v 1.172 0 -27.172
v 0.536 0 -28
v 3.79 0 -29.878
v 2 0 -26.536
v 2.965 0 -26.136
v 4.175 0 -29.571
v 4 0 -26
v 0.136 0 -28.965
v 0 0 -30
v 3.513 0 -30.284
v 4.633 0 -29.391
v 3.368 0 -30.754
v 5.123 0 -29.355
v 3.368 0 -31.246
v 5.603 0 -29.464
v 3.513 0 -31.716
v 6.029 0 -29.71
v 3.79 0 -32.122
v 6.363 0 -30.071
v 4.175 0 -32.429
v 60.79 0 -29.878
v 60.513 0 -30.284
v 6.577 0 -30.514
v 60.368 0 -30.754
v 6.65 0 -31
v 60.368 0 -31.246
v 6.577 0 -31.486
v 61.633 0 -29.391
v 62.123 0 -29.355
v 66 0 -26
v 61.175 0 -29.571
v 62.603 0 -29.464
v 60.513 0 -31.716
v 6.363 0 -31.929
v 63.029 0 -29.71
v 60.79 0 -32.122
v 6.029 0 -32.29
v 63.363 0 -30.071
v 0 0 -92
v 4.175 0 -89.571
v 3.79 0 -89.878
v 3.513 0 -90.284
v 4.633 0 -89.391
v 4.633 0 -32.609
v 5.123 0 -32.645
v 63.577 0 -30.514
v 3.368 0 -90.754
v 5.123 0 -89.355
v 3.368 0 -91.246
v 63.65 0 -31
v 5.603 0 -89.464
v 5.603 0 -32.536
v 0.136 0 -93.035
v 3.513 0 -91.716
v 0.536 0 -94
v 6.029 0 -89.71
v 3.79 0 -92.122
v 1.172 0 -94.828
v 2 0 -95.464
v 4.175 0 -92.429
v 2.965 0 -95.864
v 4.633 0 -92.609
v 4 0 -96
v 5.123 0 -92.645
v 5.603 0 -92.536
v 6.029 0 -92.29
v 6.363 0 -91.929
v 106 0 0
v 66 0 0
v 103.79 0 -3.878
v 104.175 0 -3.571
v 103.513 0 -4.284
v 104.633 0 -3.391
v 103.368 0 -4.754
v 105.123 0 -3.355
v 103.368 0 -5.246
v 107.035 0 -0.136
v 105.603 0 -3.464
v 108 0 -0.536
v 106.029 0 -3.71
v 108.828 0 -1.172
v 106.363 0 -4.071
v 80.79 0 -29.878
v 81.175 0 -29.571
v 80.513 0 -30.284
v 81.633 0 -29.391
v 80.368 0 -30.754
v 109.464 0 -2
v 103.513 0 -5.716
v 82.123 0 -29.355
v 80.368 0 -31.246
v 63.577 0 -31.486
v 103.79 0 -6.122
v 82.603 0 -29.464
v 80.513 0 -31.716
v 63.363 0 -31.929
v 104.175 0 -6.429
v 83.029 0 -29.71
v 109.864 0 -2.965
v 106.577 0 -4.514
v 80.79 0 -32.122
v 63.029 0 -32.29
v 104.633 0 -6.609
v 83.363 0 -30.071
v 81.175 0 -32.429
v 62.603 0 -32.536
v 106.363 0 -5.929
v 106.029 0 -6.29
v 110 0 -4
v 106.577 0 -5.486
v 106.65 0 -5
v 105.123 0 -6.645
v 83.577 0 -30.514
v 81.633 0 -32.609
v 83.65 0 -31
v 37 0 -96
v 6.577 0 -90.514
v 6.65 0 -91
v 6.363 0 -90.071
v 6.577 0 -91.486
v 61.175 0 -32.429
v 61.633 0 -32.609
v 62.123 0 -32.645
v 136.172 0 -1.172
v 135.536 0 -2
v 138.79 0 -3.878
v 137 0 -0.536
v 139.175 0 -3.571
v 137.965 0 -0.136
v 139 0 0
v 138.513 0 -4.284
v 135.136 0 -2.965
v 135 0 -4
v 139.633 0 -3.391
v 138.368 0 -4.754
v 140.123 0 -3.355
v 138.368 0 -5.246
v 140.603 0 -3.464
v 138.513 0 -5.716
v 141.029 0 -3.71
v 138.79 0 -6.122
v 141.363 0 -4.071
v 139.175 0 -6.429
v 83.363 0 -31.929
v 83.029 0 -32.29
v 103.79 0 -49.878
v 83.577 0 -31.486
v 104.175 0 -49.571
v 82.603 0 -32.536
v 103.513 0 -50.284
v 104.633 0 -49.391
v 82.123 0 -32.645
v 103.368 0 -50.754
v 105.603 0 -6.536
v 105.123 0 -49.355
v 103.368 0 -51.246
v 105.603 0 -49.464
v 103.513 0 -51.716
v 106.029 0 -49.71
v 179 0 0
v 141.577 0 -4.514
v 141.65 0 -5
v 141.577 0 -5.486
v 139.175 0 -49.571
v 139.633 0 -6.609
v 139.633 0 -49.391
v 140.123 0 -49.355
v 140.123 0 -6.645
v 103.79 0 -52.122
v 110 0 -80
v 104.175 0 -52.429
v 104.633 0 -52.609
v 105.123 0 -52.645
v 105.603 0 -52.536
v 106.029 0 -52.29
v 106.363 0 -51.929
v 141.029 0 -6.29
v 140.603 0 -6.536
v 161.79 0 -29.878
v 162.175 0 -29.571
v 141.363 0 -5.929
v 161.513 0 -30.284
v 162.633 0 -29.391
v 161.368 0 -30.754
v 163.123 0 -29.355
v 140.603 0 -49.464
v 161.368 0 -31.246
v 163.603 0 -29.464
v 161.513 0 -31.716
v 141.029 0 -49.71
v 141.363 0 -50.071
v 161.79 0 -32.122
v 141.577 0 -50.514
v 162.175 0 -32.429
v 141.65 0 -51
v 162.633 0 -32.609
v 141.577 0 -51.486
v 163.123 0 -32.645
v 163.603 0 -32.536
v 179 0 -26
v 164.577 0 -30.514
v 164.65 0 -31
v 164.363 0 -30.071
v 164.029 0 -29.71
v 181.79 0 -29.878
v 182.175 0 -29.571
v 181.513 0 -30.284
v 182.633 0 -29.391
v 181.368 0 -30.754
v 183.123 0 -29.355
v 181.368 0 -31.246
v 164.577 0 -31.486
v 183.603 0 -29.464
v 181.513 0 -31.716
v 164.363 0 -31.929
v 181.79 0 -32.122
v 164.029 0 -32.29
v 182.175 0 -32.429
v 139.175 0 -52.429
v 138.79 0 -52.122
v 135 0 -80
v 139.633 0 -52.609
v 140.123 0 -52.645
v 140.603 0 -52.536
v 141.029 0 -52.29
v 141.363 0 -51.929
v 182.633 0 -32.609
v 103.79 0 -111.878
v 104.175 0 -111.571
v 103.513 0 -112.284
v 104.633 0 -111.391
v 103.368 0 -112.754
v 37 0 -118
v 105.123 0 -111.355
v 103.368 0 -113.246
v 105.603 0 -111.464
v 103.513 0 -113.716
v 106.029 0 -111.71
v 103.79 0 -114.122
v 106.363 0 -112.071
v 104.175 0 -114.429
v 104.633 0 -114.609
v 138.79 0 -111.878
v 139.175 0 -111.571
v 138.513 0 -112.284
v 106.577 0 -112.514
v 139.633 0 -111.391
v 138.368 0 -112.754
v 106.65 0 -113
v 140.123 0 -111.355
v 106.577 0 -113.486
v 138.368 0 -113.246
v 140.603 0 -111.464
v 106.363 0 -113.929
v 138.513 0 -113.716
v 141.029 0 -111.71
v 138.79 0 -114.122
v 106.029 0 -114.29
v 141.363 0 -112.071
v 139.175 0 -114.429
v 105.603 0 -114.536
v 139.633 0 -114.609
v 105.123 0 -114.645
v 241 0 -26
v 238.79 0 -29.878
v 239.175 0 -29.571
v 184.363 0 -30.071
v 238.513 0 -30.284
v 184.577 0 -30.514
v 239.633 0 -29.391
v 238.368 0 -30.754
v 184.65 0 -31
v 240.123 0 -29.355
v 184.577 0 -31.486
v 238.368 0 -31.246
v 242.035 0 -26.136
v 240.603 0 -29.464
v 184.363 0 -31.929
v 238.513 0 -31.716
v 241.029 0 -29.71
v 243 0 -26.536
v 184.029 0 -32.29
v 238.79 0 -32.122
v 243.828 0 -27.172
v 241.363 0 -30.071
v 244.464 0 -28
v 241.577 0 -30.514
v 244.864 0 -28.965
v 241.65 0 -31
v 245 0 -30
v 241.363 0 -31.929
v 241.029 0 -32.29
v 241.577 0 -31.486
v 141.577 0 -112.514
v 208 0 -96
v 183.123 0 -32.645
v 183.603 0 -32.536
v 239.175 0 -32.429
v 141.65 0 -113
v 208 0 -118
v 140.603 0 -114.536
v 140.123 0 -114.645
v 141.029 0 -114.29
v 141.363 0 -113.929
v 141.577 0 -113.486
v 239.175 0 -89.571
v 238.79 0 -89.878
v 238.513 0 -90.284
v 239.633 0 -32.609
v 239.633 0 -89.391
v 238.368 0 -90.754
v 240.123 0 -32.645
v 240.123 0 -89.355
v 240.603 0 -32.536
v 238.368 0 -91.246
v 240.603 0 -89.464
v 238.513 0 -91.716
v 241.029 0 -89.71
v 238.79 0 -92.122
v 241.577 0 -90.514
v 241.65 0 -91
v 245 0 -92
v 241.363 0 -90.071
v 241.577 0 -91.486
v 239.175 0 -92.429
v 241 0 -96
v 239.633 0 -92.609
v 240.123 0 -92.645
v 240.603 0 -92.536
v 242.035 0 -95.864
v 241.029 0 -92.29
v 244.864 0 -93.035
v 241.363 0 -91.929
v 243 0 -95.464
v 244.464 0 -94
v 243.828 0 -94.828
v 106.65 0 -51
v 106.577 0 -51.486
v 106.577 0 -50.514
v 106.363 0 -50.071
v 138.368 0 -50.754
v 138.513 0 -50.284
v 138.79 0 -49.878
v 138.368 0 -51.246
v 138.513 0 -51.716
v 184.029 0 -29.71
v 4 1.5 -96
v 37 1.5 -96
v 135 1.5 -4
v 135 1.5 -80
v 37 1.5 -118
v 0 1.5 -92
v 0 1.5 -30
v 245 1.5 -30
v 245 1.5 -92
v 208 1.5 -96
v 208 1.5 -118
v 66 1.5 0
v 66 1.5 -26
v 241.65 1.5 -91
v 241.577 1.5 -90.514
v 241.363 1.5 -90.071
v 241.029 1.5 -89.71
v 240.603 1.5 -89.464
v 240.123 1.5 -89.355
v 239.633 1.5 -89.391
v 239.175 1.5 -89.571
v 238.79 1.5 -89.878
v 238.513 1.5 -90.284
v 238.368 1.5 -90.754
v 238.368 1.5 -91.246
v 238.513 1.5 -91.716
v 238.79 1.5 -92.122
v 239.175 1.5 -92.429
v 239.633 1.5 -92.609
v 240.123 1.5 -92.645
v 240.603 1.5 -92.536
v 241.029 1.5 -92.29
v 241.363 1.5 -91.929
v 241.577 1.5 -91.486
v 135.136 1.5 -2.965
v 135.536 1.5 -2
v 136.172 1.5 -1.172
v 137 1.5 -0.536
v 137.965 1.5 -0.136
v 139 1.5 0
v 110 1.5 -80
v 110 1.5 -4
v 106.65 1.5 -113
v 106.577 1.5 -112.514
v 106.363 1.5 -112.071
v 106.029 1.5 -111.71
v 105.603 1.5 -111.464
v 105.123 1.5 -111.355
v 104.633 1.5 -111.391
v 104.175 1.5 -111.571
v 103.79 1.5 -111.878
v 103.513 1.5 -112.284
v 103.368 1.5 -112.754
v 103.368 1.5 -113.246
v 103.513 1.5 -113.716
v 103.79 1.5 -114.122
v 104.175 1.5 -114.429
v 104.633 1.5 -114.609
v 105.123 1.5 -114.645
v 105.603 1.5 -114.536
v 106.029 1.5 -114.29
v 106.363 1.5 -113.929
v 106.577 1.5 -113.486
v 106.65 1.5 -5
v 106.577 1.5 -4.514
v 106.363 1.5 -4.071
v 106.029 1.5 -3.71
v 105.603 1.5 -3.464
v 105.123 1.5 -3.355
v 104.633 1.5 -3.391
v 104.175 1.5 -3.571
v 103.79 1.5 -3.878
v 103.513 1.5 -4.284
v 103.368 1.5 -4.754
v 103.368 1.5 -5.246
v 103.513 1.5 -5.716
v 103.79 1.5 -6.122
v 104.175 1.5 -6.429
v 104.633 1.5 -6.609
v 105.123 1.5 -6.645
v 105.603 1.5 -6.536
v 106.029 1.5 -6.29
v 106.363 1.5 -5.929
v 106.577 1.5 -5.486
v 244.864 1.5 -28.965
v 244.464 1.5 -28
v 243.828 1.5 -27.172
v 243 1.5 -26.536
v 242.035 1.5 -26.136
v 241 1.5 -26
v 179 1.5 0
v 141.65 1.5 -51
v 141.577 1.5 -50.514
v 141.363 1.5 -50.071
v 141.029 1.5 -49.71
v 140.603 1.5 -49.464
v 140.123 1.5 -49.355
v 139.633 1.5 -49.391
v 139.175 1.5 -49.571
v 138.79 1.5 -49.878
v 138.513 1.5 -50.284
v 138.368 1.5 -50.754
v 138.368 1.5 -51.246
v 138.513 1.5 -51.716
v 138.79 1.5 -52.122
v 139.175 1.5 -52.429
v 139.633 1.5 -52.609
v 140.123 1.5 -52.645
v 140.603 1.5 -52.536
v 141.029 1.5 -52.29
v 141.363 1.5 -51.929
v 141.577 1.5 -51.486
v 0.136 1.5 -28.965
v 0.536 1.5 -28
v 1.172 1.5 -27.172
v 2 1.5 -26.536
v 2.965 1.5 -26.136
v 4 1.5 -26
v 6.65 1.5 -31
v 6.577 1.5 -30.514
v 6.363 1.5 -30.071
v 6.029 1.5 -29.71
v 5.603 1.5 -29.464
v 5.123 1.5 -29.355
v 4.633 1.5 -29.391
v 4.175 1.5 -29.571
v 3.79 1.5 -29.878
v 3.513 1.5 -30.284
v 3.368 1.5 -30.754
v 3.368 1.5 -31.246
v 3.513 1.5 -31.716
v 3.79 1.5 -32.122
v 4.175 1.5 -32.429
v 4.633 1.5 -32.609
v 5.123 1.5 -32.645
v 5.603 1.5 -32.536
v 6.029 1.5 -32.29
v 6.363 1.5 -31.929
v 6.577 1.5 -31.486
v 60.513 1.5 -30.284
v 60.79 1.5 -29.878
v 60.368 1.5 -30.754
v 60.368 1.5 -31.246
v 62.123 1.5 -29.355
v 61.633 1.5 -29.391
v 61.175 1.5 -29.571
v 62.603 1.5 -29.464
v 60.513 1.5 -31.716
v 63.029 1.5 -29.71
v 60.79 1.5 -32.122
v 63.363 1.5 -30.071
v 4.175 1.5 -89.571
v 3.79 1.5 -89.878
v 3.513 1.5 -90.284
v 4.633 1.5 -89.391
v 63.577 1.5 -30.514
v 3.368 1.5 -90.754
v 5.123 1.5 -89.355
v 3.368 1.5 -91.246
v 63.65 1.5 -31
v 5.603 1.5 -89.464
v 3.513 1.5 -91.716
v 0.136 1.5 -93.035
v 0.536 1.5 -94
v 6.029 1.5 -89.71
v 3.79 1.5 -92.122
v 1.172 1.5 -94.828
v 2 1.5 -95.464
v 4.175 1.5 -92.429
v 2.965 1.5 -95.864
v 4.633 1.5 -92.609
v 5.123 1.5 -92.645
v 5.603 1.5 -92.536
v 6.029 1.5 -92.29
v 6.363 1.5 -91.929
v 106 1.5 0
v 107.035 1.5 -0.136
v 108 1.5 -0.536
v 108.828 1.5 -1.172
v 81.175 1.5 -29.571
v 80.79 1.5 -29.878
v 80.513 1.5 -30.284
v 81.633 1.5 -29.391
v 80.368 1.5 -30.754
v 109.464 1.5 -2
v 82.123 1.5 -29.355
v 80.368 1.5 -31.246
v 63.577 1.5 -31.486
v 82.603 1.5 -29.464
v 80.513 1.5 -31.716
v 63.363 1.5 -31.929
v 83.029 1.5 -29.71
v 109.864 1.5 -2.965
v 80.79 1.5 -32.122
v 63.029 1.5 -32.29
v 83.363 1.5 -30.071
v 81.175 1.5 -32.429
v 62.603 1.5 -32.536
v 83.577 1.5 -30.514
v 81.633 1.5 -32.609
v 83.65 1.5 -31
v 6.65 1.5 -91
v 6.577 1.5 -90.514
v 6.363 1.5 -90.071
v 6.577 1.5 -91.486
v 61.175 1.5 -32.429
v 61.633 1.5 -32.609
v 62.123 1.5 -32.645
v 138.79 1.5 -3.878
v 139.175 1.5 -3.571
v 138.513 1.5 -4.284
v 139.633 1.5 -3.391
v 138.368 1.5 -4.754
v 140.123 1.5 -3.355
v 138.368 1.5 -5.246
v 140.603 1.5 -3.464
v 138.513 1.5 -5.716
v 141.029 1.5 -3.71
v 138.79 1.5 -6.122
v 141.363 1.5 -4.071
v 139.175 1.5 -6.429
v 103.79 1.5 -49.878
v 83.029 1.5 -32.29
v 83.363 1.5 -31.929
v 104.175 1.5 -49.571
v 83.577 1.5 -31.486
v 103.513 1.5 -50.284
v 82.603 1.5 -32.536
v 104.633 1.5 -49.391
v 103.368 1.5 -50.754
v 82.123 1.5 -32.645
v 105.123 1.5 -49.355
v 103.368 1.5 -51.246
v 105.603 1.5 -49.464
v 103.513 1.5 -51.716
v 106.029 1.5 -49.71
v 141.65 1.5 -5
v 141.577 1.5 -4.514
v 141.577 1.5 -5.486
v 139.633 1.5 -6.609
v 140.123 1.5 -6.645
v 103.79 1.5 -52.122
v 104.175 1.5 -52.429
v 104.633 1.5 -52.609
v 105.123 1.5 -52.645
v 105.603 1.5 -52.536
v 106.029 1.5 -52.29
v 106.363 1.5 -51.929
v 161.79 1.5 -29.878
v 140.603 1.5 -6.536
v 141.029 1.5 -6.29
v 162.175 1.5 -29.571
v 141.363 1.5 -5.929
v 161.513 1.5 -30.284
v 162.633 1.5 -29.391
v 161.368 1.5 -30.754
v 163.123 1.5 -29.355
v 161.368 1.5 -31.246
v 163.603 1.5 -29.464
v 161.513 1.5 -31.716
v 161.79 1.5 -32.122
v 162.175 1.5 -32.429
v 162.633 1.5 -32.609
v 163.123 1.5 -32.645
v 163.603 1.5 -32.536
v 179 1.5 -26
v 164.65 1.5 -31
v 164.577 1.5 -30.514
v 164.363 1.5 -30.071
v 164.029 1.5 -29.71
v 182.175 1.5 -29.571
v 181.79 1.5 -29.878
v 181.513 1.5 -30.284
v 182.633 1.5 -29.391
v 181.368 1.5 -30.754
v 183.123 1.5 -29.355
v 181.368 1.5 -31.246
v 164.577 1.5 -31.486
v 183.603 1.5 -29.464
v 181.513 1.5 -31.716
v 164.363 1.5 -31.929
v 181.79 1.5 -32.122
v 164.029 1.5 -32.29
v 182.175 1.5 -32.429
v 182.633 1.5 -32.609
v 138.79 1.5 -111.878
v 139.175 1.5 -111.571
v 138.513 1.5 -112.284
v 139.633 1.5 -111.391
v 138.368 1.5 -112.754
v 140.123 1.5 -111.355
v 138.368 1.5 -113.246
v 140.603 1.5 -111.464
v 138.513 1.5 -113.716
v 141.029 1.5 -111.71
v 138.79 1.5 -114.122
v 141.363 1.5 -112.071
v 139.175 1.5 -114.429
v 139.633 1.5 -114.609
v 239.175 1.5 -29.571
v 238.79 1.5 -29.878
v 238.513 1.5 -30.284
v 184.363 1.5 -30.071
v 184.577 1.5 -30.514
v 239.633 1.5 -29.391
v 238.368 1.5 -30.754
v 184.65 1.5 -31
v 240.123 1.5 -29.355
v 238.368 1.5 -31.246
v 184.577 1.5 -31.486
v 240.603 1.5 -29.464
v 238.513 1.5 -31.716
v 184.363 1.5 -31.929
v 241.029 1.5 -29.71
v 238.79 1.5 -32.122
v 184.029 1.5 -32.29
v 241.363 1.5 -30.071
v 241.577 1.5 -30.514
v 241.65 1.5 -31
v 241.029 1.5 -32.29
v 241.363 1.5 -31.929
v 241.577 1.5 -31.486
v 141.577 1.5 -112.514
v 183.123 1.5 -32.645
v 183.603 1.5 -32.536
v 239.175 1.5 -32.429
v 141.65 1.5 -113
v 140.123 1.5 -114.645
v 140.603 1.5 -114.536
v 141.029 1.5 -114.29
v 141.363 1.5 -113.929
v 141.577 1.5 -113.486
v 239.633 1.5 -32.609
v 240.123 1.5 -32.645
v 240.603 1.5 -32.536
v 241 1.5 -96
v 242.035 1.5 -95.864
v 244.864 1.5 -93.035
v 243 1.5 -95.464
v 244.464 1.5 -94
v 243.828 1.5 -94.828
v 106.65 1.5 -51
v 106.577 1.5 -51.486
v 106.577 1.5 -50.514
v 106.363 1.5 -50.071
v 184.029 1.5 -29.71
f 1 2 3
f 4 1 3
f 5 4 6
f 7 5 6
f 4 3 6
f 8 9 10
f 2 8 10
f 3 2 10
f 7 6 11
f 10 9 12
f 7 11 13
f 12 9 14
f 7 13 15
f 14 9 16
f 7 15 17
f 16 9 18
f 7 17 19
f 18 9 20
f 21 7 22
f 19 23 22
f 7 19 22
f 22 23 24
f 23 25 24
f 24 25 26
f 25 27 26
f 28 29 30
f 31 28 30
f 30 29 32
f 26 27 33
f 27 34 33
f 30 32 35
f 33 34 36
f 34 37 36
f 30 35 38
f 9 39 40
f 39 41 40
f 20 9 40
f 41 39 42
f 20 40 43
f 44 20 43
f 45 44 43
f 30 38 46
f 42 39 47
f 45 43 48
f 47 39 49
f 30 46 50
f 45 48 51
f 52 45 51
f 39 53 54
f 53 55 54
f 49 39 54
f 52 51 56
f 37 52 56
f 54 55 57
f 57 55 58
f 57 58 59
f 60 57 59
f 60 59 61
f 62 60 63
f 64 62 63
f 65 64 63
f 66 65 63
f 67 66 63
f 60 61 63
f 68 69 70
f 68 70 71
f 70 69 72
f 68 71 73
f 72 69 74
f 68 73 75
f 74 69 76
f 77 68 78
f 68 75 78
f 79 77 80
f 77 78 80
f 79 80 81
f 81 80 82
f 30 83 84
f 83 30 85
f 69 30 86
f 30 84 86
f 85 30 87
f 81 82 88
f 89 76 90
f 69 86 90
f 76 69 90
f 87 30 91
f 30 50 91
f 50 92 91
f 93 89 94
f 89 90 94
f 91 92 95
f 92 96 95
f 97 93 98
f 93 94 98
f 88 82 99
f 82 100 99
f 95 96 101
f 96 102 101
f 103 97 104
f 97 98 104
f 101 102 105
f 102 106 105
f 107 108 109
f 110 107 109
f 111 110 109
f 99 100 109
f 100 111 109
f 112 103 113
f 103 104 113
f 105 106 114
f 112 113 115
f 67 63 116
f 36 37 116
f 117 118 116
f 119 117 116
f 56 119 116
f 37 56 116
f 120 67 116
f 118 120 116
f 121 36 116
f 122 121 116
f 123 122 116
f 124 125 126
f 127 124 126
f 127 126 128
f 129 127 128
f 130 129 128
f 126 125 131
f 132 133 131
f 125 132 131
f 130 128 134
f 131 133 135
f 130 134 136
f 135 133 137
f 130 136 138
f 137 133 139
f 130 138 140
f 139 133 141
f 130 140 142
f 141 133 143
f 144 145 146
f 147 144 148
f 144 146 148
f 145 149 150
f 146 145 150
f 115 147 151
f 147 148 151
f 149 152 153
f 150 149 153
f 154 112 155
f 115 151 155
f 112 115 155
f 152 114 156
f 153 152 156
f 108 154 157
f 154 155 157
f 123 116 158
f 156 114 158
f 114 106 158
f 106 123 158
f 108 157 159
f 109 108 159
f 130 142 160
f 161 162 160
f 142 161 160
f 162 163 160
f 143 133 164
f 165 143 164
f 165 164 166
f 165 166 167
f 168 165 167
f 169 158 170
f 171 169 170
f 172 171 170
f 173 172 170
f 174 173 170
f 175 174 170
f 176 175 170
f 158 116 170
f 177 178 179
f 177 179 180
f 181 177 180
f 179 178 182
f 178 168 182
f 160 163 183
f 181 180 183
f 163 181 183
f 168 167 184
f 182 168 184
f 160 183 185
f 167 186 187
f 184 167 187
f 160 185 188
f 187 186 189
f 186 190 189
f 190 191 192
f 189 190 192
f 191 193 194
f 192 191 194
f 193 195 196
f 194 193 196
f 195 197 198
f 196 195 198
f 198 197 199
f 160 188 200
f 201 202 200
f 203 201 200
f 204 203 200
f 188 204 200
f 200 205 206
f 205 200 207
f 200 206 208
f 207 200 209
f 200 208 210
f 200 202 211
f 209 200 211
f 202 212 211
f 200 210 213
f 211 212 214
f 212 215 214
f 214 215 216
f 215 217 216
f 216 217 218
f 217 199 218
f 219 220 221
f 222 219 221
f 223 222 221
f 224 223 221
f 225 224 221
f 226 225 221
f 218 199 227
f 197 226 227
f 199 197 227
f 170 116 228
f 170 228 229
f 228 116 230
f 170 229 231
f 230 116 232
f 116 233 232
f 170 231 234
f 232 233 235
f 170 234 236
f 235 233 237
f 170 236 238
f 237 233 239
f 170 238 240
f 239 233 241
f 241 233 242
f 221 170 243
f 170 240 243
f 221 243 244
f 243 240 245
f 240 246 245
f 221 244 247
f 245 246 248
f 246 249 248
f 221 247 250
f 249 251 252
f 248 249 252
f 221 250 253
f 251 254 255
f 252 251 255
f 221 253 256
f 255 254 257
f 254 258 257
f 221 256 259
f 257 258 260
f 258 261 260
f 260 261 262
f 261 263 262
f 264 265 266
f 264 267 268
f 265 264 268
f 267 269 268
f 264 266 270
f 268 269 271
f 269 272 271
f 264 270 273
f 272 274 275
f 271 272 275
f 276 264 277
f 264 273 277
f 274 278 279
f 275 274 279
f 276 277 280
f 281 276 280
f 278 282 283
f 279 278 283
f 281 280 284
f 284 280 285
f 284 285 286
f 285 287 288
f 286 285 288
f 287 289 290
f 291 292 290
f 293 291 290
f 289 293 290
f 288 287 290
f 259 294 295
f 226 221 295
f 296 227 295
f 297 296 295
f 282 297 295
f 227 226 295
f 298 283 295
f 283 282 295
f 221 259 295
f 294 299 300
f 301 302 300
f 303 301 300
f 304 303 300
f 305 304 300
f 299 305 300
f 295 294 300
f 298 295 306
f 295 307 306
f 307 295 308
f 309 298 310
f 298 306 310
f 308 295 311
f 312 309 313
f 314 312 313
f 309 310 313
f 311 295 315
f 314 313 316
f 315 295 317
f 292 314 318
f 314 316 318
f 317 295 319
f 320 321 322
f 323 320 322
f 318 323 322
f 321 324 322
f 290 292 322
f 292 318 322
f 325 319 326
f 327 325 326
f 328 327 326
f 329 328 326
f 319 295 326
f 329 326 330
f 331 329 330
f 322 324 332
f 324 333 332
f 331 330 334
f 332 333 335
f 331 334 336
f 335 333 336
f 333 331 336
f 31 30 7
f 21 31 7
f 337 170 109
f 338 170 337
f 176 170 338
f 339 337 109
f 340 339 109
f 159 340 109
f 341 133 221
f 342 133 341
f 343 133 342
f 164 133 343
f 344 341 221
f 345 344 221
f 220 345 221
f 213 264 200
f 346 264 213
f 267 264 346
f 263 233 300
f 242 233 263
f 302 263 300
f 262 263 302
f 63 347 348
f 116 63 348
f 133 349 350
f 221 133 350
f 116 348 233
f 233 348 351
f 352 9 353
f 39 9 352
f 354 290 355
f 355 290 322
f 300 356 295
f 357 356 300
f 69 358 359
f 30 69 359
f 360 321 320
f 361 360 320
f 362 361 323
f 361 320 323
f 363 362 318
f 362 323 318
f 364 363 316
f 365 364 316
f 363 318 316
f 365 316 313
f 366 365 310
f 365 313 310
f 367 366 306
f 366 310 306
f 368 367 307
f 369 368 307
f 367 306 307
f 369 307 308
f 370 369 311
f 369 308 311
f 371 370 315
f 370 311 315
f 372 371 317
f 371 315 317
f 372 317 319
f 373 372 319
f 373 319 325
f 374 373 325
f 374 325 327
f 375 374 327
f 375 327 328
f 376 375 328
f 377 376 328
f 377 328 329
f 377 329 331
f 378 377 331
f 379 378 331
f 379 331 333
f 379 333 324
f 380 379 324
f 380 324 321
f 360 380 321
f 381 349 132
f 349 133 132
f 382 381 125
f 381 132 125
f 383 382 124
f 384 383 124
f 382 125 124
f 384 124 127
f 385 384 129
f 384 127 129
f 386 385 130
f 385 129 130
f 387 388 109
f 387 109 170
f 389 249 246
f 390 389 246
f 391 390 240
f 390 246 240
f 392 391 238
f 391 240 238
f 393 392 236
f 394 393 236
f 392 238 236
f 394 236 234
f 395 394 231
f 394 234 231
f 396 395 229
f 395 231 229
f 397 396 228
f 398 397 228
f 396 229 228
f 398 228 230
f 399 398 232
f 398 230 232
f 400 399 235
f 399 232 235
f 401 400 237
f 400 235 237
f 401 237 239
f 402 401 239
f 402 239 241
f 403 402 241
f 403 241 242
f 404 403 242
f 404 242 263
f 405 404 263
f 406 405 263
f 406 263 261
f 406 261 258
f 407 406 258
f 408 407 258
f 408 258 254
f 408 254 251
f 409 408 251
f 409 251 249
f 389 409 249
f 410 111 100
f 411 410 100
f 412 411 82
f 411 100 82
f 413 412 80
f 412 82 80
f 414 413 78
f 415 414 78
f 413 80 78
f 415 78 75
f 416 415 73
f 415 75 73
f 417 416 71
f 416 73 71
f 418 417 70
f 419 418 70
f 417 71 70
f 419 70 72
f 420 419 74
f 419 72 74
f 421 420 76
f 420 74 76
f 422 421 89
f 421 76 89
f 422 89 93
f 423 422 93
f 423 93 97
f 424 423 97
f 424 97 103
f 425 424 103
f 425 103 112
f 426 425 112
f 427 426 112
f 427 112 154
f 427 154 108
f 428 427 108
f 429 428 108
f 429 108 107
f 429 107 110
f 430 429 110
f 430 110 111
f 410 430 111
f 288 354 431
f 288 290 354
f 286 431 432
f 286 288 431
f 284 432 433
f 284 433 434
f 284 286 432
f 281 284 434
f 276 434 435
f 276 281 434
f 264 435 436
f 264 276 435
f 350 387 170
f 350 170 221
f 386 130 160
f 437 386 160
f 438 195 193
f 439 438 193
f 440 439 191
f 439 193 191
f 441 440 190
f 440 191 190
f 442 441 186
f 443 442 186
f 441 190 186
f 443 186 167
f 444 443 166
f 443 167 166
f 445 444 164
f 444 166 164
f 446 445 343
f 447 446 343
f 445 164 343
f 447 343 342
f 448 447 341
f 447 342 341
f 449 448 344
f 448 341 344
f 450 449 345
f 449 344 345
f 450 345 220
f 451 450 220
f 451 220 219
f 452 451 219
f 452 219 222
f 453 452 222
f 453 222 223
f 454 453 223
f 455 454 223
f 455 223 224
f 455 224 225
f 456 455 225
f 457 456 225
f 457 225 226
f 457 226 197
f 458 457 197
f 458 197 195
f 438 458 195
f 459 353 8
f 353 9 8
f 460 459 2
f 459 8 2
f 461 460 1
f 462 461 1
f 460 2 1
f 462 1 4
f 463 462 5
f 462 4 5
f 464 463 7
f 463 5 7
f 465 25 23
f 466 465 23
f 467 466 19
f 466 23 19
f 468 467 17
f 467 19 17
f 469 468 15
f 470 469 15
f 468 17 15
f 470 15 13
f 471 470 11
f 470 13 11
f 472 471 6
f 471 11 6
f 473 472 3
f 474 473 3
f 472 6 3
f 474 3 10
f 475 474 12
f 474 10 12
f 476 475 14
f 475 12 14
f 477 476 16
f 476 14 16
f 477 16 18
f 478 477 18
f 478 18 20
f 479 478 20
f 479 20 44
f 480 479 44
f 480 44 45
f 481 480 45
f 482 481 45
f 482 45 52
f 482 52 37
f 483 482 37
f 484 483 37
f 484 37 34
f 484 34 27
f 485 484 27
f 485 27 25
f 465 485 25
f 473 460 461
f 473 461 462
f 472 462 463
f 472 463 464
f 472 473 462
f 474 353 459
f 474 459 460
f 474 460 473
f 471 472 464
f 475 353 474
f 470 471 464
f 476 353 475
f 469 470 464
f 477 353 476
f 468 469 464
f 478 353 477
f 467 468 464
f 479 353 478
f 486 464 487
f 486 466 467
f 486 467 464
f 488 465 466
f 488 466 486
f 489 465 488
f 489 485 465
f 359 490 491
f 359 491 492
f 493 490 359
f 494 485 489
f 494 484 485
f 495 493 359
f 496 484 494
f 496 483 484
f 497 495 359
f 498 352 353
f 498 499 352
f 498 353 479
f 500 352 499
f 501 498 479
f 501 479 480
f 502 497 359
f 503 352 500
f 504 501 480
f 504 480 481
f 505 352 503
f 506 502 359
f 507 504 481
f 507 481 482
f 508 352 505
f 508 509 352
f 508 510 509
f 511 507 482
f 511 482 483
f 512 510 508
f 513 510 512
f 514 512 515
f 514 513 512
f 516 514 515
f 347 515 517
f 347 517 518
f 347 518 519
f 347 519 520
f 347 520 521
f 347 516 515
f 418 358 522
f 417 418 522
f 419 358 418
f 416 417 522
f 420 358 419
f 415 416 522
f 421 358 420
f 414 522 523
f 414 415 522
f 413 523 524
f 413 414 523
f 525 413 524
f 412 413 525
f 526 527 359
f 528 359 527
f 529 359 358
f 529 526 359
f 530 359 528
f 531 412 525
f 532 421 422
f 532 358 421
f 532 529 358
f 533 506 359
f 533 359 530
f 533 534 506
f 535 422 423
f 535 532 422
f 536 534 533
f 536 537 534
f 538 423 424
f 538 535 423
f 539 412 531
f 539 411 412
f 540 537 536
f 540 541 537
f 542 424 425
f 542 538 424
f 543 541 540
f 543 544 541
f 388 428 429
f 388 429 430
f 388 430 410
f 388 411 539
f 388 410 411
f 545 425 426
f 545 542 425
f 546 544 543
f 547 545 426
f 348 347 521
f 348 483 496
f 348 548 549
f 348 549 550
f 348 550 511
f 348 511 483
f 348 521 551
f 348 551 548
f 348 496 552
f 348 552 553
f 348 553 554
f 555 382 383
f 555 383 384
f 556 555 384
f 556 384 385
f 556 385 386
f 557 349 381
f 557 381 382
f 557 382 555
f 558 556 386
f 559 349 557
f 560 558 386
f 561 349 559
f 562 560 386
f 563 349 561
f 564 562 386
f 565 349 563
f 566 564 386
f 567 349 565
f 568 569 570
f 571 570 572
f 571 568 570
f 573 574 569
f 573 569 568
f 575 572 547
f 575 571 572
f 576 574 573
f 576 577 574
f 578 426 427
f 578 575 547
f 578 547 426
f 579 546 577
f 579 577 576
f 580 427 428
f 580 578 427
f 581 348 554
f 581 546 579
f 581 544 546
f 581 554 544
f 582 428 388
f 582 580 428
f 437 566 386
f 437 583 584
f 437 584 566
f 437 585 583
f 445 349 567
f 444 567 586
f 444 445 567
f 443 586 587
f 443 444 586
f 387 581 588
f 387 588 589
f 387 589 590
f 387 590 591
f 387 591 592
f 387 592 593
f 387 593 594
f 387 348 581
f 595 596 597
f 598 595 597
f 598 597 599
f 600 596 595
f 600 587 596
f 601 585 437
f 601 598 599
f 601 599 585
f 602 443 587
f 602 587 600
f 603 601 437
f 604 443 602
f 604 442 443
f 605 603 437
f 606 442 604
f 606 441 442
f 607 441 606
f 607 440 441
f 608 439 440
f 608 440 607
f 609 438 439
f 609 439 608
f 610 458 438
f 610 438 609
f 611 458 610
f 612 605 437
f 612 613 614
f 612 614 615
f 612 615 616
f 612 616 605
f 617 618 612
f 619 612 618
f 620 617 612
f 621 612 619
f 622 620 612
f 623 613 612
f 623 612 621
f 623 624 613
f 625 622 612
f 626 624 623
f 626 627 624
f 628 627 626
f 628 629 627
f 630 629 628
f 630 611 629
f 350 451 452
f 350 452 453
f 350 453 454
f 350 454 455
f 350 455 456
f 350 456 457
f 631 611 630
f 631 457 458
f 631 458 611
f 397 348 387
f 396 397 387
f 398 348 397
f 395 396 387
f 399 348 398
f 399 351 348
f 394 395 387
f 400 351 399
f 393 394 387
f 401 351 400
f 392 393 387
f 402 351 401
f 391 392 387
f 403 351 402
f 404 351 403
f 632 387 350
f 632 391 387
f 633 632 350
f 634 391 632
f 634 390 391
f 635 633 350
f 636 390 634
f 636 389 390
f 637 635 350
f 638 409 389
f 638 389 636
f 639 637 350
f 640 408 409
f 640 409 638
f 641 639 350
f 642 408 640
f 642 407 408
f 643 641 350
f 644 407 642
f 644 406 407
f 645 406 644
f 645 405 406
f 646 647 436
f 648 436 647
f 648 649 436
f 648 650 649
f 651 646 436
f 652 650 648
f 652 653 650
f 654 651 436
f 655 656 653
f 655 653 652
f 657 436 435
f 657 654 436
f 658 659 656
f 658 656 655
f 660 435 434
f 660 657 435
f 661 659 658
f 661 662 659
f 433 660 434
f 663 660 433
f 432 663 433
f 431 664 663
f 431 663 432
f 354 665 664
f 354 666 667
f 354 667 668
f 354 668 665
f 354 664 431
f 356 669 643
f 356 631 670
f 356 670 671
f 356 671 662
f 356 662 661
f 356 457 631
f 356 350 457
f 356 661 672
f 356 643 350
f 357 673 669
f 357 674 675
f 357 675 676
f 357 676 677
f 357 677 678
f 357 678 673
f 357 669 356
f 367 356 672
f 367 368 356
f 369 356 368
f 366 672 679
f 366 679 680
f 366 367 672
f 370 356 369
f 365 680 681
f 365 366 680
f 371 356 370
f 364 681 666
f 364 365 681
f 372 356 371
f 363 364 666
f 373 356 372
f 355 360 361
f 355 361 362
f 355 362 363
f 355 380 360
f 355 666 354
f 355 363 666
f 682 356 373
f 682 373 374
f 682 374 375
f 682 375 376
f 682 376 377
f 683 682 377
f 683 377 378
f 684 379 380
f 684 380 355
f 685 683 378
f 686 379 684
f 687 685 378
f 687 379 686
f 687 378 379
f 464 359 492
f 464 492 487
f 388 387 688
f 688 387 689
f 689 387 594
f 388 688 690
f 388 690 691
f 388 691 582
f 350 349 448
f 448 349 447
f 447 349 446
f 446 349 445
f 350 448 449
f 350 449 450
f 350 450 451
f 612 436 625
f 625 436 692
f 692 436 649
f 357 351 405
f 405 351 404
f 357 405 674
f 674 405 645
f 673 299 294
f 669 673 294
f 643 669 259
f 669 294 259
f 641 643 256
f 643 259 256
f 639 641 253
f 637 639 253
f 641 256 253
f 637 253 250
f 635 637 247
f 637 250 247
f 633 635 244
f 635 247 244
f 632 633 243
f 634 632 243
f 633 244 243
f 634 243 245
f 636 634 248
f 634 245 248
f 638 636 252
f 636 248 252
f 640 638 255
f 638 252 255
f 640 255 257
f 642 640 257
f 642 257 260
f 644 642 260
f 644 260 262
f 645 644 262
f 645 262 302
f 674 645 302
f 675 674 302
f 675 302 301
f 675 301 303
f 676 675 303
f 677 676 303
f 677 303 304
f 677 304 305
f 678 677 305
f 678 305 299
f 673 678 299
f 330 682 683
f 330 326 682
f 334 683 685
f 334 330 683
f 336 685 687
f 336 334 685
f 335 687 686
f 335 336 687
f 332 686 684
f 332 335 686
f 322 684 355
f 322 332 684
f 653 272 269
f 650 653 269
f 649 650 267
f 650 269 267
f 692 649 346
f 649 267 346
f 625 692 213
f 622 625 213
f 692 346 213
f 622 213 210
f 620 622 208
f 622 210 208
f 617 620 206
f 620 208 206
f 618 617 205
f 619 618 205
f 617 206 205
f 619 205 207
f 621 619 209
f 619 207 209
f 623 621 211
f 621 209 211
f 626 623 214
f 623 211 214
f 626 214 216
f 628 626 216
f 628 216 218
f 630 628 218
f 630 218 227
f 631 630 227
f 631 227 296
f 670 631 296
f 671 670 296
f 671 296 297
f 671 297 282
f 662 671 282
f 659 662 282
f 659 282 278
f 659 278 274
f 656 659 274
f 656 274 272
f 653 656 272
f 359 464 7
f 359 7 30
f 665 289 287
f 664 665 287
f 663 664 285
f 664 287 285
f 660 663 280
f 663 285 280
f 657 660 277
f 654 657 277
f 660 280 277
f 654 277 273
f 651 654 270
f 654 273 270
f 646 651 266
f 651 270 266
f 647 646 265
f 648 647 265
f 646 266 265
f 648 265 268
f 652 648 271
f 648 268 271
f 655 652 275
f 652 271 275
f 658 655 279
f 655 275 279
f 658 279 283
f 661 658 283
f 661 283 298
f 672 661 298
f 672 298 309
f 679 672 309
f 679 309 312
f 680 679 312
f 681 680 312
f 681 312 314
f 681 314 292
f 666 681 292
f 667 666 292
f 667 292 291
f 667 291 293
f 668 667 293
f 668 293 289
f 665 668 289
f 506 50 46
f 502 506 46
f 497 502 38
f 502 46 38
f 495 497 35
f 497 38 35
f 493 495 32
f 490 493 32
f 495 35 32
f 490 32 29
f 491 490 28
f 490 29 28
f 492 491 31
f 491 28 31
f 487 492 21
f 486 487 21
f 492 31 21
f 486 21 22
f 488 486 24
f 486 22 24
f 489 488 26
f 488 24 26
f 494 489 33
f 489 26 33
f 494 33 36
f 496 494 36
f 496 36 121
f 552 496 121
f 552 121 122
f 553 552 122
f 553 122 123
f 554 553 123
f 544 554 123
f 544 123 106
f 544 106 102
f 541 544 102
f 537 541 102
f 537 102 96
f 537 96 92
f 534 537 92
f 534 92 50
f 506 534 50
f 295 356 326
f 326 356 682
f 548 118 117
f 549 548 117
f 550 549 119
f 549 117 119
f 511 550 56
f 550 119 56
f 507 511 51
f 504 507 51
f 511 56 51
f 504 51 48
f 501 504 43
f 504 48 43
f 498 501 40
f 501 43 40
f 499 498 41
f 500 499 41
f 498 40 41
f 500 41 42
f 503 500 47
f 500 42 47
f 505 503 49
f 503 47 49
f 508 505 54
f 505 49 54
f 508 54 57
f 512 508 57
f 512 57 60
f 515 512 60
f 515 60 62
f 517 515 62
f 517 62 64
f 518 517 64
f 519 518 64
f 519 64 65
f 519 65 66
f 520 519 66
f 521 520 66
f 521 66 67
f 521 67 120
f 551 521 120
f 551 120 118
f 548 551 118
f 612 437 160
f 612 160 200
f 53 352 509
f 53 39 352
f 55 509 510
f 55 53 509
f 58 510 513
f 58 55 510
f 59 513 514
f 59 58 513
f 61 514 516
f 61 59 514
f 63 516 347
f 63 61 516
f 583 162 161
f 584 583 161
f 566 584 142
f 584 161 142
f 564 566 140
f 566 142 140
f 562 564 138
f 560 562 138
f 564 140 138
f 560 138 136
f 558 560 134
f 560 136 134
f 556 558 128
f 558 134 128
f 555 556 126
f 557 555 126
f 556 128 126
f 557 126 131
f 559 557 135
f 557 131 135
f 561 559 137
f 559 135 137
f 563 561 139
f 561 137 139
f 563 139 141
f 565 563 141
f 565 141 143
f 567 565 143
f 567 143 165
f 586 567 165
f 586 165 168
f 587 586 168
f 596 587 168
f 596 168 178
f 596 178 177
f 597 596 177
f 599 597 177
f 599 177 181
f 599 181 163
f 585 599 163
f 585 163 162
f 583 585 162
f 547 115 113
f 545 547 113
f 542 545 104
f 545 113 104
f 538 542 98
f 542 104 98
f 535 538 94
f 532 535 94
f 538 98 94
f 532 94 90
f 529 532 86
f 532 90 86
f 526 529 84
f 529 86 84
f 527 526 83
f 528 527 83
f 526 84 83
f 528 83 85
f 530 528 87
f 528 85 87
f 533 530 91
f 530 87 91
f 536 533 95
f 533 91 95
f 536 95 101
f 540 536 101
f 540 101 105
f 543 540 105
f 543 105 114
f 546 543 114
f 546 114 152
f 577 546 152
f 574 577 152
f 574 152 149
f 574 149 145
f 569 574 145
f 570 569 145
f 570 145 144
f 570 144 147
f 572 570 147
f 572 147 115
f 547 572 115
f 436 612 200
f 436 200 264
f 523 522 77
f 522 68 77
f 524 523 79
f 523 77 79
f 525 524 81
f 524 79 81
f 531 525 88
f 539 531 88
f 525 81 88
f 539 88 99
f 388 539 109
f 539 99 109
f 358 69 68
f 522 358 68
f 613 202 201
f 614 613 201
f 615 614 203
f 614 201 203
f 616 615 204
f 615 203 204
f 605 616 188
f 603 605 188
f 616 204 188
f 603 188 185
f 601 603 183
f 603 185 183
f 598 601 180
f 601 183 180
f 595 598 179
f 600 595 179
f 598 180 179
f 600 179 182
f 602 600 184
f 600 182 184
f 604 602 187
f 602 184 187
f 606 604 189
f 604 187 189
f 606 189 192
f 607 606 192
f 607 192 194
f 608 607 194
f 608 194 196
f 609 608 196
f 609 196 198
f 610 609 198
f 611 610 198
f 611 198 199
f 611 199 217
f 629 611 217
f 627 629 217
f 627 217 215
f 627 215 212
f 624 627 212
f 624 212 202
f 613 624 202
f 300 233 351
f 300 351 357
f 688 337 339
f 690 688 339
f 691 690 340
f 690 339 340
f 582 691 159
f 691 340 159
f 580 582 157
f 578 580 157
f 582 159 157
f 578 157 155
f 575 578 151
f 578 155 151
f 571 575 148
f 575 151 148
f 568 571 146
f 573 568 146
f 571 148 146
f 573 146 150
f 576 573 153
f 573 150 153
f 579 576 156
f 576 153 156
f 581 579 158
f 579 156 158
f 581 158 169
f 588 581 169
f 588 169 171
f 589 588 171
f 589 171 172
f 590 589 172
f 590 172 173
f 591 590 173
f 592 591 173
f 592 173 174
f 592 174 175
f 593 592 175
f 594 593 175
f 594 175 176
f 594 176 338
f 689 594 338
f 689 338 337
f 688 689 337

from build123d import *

# Parameters (mm, degrees)
SKETCH1_W           = 245
SKETCH1_H           = 118
BOSS_EXTRUDE1_DEPTH = 1.5
SKETCH2_W           = 37
SKETCH2_H           = 22
SKETCH2_W_2         = 66
SKETCH2_H_2         = 26
SKETCH2_W_3         = 25
SKETCH2_H_3         = 80
CUT_EXTRUDE1_DEPTH  = 2.5
SKETCH3_R           = 1.65
CUT_EXTRUDE2_DEPTH  = 10
FILLET1_R           = 4


with BuildPart() as part:
    # Sketch1 → Boss-Extrude1 (new body)
    with BuildSketch(Plane(origin=(0, 0, 0), x_dir=(1, 0, 0), z_dir=(0, 1, 0))):
        with Locations((122.5, 59)):
            Rectangle(SKETCH1_W, SKETCH1_H)
    extrude(amount=BOSS_EXTRUDE1_DEPTH)

    # Sketch2 → Cut-Extrude1 (cut, through all)
    with BuildSketch(Plane(origin=(0, 1.5, 0), x_dir=(1, 0, 0), z_dir=(0, 1, 0))):
        with Locations((18.5, 107)):
            Rectangle(SKETCH2_W, SKETCH2_H)
        with Locations((33, 13)):
            Rectangle(SKETCH2_W_2, SKETCH2_H_2)
        with Locations((226.5, 107)):
            Rectangle(SKETCH2_W, SKETCH2_H)
        with Locations((212, 13)):
            Rectangle(SKETCH2_W_2, SKETCH2_H_2)
        with Locations((122.5, 40)):
            Rectangle(SKETCH2_W_3, SKETCH2_H_3)
    extrude(amount=-CUT_EXTRUDE1_DEPTH, mode=Mode.SUBTRACT)

    # Sketch3 → Cut-Extrude2 (cut)
    with BuildSketch(Plane.XZ):
        with Locations((5, -31)):
            Circle(SKETCH3_R)
        with Locations((5, -91)):
            Circle(SKETCH3_R)
        with Locations((105, -5)):
            Circle(SKETCH3_R)
        with Locations((105, -51)):
            Circle(SKETCH3_R)
        with Locations((105, -113)):
            Circle(SKETCH3_R)
        with Locations((140, -51)):
            Circle(SKETCH3_R)
        with Locations((140, -5)):
            Circle(SKETCH3_R)
        with Locations((140, -113)):
            Circle(SKETCH3_R)
        with Locations((240, -31)):
            Circle(SKETCH3_R)
        with Locations((240, -91)):
            Circle(SKETCH3_R)
        with Locations((62, -31)):
            Circle(SKETCH3_R)
        with Locations((82, -31)):
            Circle(SKETCH3_R)
        with Locations((163, -31)):
            Circle(SKETCH3_R)
        with Locations((183, -31)):
            Circle(SKETCH3_R)
    extrude(amount=-CUT_EXTRUDE2_DEPTH, mode=Mode.SUBTRACT)

    # Fillet1
    fillet1_edges = [part.edges().sort_by_distance(p)[0] for p in [
        (0, 0.75, -26),
        (245, 0.75, -96),
        (245, 0.75, -26),
        (110, 0.75, 0),
        (135, 0.75, 0),
        (0, 0.75, -96),
    ]]
    fillet(fillet1_edges, radius=FILLET1_R)


solid = part.part
